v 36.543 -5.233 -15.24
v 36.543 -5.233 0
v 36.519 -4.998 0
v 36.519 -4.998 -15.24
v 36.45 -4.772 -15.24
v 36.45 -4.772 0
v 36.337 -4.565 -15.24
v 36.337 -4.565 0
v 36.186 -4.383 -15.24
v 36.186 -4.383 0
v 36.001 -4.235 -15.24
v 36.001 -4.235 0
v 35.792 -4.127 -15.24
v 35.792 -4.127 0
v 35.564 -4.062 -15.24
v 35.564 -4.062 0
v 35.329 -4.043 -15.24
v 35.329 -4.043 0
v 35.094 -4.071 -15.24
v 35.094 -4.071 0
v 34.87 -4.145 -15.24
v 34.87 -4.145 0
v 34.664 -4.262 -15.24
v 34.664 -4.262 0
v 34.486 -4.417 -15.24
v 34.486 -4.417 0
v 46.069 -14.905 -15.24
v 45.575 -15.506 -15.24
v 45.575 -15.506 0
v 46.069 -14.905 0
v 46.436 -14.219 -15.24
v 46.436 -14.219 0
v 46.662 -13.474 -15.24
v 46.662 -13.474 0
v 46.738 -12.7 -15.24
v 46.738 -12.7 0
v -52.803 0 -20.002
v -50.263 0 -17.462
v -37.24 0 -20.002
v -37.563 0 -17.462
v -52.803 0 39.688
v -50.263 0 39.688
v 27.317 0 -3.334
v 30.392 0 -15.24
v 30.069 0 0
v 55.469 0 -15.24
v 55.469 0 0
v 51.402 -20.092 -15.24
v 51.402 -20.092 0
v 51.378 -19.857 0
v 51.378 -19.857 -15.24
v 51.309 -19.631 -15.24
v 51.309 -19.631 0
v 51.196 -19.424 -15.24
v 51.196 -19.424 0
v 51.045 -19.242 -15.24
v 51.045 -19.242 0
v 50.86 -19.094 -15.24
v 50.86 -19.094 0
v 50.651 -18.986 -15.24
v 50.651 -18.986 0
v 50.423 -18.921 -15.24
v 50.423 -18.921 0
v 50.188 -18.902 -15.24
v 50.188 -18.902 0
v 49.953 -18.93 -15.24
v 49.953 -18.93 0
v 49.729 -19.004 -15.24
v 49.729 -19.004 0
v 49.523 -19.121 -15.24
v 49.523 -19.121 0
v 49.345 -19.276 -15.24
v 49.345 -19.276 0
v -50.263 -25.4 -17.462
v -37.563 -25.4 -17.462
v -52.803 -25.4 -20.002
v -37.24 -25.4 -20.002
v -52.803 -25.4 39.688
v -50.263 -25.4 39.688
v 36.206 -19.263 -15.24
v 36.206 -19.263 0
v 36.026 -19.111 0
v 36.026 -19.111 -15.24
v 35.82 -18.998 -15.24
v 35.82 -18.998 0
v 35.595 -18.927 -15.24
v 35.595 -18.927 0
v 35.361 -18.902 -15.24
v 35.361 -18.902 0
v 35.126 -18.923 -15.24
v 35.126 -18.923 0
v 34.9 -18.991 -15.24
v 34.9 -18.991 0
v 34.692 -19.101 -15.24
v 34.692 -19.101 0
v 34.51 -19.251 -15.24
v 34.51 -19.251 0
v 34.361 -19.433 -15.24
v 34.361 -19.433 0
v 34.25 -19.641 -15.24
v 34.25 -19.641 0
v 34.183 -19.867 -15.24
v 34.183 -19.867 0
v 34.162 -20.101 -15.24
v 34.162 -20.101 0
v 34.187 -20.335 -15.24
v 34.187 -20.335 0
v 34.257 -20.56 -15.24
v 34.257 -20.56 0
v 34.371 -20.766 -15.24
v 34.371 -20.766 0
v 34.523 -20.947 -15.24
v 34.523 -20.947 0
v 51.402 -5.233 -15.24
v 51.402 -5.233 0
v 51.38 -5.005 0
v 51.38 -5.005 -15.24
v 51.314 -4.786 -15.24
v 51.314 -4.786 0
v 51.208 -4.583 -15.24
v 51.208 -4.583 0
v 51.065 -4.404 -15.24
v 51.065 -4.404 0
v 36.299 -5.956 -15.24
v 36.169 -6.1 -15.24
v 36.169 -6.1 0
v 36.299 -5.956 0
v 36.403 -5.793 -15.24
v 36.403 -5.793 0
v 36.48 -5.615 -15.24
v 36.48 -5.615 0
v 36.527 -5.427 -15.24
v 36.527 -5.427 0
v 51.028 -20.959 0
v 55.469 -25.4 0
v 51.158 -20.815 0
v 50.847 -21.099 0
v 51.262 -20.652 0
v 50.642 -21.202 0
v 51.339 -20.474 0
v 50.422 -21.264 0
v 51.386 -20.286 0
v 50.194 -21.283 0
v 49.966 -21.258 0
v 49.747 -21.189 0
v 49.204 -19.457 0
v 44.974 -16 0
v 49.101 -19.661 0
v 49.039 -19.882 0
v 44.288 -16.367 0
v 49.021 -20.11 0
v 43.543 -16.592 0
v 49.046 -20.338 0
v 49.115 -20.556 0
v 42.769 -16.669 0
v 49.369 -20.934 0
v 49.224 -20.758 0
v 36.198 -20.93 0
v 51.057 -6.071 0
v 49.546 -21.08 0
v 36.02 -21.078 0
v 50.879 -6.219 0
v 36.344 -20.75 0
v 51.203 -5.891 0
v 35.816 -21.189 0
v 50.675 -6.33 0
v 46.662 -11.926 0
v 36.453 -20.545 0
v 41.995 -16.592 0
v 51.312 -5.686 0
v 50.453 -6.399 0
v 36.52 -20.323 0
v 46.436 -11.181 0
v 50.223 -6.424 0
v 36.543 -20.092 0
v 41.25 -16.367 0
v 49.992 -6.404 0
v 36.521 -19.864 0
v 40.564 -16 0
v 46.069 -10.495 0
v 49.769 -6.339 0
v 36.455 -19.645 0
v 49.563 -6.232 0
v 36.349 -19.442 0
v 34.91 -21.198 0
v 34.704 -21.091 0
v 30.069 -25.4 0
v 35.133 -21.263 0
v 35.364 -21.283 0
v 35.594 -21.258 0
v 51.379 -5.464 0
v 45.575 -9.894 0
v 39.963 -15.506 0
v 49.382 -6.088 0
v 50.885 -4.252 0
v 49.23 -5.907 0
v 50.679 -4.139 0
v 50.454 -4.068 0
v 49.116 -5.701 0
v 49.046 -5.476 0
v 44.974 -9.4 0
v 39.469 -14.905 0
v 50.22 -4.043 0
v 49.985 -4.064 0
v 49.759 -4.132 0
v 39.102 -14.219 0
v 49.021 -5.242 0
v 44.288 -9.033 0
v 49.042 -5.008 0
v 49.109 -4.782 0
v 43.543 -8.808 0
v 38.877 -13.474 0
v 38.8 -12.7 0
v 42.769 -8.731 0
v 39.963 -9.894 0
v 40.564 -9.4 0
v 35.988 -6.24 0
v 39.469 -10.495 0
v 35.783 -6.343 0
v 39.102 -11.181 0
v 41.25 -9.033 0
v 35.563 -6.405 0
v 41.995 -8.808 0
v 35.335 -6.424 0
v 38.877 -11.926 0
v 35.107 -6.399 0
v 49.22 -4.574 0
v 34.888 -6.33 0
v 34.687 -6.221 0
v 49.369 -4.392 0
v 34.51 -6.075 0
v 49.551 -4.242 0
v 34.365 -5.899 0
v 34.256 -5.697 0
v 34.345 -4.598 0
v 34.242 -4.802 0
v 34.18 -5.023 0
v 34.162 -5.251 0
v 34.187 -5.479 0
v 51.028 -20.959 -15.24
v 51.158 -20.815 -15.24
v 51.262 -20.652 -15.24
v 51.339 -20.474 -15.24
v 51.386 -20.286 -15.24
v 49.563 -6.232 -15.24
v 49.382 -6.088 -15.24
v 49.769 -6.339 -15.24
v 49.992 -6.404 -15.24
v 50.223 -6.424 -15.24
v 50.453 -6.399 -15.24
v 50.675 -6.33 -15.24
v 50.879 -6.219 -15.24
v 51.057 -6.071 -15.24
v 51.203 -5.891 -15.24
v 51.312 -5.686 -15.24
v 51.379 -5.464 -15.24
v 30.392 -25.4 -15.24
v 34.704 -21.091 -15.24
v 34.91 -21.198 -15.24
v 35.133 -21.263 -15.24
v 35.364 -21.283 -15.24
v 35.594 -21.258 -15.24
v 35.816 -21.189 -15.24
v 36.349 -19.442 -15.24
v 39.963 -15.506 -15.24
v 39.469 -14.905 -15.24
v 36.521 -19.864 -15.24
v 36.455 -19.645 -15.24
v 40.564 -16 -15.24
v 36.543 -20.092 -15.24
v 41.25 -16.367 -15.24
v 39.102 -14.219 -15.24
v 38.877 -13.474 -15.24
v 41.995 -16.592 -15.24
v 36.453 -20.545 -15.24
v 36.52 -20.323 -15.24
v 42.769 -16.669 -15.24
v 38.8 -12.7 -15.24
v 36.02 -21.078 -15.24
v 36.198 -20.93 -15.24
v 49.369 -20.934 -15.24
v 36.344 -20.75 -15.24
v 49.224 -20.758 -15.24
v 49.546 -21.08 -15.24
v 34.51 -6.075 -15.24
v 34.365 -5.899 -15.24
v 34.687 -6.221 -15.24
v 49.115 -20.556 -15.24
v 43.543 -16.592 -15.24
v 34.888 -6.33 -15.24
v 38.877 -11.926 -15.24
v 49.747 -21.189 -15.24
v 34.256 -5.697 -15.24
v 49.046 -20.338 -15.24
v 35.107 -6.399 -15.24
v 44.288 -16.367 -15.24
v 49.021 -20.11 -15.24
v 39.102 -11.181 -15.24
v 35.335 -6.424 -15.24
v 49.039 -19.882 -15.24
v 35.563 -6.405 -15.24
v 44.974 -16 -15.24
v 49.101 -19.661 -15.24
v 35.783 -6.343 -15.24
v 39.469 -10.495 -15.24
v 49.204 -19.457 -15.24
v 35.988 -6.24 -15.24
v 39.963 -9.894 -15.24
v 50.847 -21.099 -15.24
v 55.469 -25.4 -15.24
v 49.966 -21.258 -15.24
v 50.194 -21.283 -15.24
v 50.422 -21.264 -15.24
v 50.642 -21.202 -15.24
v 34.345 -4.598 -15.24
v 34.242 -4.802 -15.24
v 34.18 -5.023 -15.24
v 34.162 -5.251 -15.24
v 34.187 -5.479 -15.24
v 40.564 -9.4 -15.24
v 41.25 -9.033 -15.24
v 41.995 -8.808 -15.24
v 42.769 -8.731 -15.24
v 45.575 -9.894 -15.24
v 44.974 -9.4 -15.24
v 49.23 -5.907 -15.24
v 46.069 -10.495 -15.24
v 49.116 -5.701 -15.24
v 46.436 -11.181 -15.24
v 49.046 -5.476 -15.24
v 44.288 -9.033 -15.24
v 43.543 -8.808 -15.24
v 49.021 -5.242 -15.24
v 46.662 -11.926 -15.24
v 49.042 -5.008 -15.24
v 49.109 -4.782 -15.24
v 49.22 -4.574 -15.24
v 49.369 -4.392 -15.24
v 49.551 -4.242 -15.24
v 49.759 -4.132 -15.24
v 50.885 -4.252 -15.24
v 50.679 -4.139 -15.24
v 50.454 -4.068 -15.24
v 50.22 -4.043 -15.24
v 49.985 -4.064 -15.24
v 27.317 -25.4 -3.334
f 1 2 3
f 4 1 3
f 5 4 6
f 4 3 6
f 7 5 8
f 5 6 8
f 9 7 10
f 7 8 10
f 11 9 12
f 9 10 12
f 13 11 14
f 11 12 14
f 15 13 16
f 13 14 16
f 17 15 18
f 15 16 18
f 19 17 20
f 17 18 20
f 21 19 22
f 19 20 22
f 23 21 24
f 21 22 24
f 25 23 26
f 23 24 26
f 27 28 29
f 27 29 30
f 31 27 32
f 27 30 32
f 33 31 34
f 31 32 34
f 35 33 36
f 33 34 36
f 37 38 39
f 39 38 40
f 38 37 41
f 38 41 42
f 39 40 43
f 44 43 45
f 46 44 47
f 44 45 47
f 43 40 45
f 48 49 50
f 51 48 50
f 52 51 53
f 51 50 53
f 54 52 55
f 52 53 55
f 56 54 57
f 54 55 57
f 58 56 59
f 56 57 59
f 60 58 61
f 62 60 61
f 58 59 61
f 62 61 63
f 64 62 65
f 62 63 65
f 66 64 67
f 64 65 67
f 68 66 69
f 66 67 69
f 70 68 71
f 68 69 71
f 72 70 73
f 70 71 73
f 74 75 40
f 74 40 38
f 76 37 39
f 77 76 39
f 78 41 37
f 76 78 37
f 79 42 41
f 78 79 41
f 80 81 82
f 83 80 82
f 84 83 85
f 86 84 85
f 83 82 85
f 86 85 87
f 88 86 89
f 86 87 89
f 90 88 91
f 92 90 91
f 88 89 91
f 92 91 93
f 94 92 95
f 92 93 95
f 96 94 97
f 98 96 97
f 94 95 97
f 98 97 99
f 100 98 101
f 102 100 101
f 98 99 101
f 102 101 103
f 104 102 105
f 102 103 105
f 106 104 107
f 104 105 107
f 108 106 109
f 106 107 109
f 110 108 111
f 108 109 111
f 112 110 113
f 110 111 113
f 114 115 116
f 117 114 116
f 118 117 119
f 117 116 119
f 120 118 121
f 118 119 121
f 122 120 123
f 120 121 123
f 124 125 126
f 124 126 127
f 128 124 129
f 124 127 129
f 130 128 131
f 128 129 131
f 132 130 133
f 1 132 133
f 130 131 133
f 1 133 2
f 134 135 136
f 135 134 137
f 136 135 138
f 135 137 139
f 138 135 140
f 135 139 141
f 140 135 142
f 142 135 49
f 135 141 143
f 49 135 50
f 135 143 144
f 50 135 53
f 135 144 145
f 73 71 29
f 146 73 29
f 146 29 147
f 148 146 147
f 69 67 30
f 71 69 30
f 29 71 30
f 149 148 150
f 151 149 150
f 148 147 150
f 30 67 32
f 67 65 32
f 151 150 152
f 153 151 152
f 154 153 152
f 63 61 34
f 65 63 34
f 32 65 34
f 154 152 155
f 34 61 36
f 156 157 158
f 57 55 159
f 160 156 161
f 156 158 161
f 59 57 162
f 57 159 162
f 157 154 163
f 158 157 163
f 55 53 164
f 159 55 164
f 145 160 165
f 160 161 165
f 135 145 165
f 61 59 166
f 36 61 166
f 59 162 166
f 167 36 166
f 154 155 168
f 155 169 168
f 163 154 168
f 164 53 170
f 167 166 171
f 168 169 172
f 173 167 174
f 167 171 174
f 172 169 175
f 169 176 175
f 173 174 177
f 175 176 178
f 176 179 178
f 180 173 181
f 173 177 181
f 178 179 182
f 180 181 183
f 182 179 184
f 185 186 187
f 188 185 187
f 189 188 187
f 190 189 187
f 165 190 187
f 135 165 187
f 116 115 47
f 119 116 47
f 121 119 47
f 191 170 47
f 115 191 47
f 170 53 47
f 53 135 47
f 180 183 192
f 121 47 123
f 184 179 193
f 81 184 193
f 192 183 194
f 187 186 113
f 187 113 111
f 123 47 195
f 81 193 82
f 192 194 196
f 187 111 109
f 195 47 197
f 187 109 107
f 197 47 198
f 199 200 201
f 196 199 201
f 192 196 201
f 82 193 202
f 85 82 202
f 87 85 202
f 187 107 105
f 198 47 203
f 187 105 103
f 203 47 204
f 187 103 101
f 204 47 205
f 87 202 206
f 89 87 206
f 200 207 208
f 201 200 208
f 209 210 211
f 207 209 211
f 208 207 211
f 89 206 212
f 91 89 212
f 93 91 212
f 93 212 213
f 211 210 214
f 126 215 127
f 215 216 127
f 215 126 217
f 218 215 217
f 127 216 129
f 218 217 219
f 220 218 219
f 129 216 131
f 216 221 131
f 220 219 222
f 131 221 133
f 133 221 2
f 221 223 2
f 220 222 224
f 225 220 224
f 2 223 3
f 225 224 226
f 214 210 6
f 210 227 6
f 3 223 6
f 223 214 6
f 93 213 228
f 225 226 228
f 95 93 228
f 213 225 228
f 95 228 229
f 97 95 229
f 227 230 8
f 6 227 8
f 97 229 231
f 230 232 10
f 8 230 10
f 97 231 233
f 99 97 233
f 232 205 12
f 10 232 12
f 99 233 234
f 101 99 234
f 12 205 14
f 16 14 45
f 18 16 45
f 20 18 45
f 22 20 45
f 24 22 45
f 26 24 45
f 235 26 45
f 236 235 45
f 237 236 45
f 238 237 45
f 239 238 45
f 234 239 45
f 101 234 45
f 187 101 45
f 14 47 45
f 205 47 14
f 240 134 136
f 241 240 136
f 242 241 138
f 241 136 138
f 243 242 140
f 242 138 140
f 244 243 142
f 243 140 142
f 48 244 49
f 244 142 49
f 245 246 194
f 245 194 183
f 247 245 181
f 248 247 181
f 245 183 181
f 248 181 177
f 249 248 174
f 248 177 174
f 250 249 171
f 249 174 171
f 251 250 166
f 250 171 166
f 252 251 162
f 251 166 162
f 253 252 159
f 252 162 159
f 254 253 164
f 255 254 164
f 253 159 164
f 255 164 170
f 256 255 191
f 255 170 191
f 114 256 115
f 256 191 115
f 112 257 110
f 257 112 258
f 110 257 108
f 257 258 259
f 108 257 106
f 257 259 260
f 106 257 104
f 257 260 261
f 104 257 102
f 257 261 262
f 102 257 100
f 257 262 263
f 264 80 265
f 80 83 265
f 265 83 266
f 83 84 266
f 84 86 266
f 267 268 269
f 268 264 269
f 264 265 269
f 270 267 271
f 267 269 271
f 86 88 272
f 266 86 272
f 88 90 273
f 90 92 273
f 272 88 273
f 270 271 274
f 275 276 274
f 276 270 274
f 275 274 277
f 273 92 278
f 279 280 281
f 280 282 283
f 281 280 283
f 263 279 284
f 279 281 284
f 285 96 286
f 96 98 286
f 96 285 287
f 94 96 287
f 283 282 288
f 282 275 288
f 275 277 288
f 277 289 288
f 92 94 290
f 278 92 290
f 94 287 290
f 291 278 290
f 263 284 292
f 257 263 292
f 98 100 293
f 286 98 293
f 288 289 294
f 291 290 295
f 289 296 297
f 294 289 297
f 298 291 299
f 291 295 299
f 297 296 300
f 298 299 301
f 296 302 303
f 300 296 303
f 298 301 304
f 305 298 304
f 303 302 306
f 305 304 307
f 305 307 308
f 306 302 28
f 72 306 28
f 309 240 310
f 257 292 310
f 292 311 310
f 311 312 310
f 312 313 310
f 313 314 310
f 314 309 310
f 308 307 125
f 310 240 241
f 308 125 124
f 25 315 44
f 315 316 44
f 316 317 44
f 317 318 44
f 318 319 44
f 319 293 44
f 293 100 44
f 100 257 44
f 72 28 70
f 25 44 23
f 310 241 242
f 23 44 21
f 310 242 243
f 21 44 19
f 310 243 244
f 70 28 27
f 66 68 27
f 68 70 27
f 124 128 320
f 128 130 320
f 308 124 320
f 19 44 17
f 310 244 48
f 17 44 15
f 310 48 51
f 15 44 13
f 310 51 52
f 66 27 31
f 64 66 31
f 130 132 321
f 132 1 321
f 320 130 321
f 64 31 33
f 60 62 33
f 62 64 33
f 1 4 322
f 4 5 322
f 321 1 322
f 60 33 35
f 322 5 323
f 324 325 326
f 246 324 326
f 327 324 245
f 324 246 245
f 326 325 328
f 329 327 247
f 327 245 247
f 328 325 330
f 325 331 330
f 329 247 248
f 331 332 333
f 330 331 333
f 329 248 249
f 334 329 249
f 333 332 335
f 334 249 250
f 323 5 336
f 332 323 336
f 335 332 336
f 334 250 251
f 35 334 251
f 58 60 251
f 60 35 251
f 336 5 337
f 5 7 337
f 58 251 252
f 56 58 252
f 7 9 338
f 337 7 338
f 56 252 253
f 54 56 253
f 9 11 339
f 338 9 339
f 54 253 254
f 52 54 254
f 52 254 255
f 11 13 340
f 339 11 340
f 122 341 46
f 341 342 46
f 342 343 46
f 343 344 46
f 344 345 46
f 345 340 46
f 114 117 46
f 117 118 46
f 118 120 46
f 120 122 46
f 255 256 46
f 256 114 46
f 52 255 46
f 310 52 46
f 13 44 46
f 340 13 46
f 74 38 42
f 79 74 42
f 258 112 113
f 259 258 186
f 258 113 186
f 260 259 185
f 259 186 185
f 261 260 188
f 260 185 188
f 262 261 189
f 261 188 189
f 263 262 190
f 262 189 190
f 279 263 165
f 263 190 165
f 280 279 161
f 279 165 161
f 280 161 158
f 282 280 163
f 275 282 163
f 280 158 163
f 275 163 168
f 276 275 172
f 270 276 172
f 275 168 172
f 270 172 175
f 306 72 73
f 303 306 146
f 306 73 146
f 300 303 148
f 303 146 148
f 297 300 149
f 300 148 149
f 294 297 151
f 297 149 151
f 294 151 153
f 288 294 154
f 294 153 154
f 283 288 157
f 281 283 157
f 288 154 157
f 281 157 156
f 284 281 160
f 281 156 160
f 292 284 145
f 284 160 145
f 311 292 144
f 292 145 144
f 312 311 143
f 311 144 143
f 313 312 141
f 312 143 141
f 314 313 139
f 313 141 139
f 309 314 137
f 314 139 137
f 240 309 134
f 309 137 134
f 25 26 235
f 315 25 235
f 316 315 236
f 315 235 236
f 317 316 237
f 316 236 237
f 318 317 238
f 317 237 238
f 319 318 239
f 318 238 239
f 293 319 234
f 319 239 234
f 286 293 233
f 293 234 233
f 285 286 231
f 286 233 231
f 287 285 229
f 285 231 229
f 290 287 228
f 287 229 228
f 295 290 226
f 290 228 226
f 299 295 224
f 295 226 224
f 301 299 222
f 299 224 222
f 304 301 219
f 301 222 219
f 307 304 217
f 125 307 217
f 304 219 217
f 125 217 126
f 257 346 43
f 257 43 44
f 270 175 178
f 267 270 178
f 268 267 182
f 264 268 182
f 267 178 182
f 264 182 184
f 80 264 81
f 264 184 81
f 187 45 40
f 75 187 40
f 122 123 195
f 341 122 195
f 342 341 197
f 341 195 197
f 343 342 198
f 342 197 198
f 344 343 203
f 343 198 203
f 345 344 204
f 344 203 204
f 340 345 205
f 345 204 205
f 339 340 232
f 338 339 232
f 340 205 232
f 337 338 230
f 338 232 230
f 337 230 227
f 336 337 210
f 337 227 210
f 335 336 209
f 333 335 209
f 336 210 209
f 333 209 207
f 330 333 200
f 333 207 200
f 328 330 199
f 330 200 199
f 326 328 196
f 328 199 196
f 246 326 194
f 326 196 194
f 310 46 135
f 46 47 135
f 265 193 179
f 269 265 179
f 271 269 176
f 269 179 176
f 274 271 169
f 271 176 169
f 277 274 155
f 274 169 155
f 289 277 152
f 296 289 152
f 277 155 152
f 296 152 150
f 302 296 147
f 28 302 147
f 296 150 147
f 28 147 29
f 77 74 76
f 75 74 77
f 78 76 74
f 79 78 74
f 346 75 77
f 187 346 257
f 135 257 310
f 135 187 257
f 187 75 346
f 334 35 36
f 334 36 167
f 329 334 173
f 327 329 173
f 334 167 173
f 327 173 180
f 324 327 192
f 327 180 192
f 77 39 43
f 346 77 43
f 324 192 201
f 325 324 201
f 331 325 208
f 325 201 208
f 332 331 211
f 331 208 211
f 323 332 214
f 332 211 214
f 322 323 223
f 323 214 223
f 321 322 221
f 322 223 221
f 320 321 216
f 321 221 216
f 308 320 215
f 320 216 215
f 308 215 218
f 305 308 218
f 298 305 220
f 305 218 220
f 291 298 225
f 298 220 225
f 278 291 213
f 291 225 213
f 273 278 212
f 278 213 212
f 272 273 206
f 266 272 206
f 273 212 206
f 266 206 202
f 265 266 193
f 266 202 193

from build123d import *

# Parameters (mm, degrees)
F1_DEPTH = 25.4
F3_DEPTH = 12.7
F5_DEPTH = 25.4
F6_DEPTH = 20.0035


with BuildPart() as f1:
    # F0 (on Front) → F1 (new body)
    with BuildSketch(Plane.XZ):
        Polygon((-50.2629226224, -17.4625), (-50.2629226224, 39.6875), (-52.8029226224, 39.6875), (-52.8029226224, -20.0025), (-37.2403003217, -20.0025), (30.3916713614, -2.54), (55.4690490608, -2.54), (55.4690490608, 0), (30.0690490608, 0), (-37.5629226224, -17.4625), align=None)
    extrude(amount=F1_DEPTH)

    # F3 (add): a face of the model
    f3_faces = [f1.faces().sort_by_distance(p)[0] for p in [
        (42.9303602111, -12.7, -2.54),
    ]]
    extrude(f3_faces, amount=F3_DEPTH)

    # F4 (on face) → F5 (join)
    with BuildSketch(Plane.XZ.offset(25.4)):
        Polygon((27.3174908304, -3.33375), (30.3916713614, -15.24), (30.3916713614, -2.54), align=None)
    extrude(amount=-F5_DEPTH)

    # F2 (on face) → F6 (cut, through all)
    with BuildSketch(Plane.XY):
        with BuildLine():
            Line((42.7690490608, -12.7), (45.5753790986, -9.8936699622))
            ThreePointArc((45.5753790986, -9.8936699622), (42.7690490608, -8.73125), (39.962719023, -9.8936699622))
            Line((39.962719023, -9.8936699622), (42.7690490608, -12.7))
        make_face()
        with BuildLine():
            ThreePointArc((45.5753790986, -15.5063300378), (46.4356959554, -14.2187748722), (46.7377990608, -12.7))
            ThreePointArc((46.7377990608, -12.7), (46.4356959554, -11.1812251278), (45.5753790986, -9.8936699622))
            Line((45.5753790986, -9.8936699622), (42.7690490608, -12.7))
            Line((42.7690490608, -12.7), (45.5753790986, -15.5063300378))
        make_face()
        with BuildLine():
            ThreePointArc((39.962719023, -15.5063300378), (42.7690490608, -16.66875), (45.5753790986, -15.5063300378))
            Line((45.5753790986, -15.5063300378), (42.7690490608, -12.7))
            Line((42.7690490608, -12.7), (39.962719023, -15.5063300378))
        make_face()
        with BuildLine():
            Line((42.7690490608, -12.7), (39.962719023, -9.8936699622))
            ThreePointArc((39.962719023, -9.8936699622), (38.8002990608, -12.7), (39.962719023, -15.5063300378))
            Line((39.962719023, -15.5063300378), (42.7690490608, -12.7))
        make_face()
        with BuildLine():
            ThreePointArc((51.0651573617, -4.4038916991), (49.3692304778, -4.3915855299), (49.3815366471, -6.0875124137))
            Line((49.3815366471, -6.0875124137), (51.0651573617, -4.4038916991))
        make_face()
        with BuildLine():
            Line((51.0651573617, -4.4038916991), (49.3815366471, -6.0875124137))
            ThreePointArc((49.3815366471, -6.0875124137), (50.6747316424, -6.3301435284), (51.4017544892, -5.2334845412))
            ThreePointArc((51.4017544892, -5.2334845412), (51.314400722, -4.7858457611), (51.0651573617, -4.4038916991))
        make_face()
        with BuildLine():
            ThreePointArc((51.4017544892, -20.0924845412), (50.6505107302, -18.9858987941), (49.3447978224, -19.2757487616))
            Line((49.3447978224, -19.2757487616), (51.0278652688, -20.958816208))
            ThreePointArc((51.0278652688, -20.958816208), (51.3042932299, -20.564269372), (51.4017544892, -20.0924845412))
        make_face()
        with BuildLine():
            Line((51.0278652688, -20.958816208), (49.3447978224, -19.2757487616))
            ThreePointArc((49.3447978224, -19.2757487616), (49.3692304778, -20.9343835526), (51.0278652688, -20.958816208))
        make_face()
        with BuildLine():
            ThreePointArc((36.5427544892, -20.0924845412), (36.455400722, -19.6448457611), (36.2061573617, -19.2628916991))
            Line((36.2061573617, -19.2628916991), (34.5225366471, -20.9465124137))
            ThreePointArc((34.5225366471, -20.9465124137), (35.8157316424, -21.1891435284), (36.5427544892, -20.0924845412))
        make_face()
        with BuildLine():
            Line((34.5225366471, -20.9465124137), (36.2061573617, -19.2628916991))
            ThreePointArc((36.2061573617, -19.2628916991), (34.5102304778, -19.2505855299), (34.5225366471, -20.9465124137))
        make_face()
        with BuildLine():
            ThreePointArc((34.4857978224, -4.4167487616), (34.5102304778, -6.0753835526), (36.1688652688, -6.099816208))
            Line((36.1688652688, -6.099816208), (34.4857978224, -4.4167487616))
        make_face()
        with BuildLine():
            Line((34.4857978224, -4.4167487616), (36.1688652688, -6.099816208))
            ThreePointArc((36.1688652688, -6.099816208), (36.4452932299, -5.705269372), (36.5427544892, -5.2334845412))
            ThreePointArc((36.5427544892, -5.2334845412), (35.7915107302, -4.1268987941), (34.4857978224, -4.4167487616))
        make_face()
    extrude(amount=-F6_DEPTH, mode=Mode.SUBTRACT)


solid = f1.part
